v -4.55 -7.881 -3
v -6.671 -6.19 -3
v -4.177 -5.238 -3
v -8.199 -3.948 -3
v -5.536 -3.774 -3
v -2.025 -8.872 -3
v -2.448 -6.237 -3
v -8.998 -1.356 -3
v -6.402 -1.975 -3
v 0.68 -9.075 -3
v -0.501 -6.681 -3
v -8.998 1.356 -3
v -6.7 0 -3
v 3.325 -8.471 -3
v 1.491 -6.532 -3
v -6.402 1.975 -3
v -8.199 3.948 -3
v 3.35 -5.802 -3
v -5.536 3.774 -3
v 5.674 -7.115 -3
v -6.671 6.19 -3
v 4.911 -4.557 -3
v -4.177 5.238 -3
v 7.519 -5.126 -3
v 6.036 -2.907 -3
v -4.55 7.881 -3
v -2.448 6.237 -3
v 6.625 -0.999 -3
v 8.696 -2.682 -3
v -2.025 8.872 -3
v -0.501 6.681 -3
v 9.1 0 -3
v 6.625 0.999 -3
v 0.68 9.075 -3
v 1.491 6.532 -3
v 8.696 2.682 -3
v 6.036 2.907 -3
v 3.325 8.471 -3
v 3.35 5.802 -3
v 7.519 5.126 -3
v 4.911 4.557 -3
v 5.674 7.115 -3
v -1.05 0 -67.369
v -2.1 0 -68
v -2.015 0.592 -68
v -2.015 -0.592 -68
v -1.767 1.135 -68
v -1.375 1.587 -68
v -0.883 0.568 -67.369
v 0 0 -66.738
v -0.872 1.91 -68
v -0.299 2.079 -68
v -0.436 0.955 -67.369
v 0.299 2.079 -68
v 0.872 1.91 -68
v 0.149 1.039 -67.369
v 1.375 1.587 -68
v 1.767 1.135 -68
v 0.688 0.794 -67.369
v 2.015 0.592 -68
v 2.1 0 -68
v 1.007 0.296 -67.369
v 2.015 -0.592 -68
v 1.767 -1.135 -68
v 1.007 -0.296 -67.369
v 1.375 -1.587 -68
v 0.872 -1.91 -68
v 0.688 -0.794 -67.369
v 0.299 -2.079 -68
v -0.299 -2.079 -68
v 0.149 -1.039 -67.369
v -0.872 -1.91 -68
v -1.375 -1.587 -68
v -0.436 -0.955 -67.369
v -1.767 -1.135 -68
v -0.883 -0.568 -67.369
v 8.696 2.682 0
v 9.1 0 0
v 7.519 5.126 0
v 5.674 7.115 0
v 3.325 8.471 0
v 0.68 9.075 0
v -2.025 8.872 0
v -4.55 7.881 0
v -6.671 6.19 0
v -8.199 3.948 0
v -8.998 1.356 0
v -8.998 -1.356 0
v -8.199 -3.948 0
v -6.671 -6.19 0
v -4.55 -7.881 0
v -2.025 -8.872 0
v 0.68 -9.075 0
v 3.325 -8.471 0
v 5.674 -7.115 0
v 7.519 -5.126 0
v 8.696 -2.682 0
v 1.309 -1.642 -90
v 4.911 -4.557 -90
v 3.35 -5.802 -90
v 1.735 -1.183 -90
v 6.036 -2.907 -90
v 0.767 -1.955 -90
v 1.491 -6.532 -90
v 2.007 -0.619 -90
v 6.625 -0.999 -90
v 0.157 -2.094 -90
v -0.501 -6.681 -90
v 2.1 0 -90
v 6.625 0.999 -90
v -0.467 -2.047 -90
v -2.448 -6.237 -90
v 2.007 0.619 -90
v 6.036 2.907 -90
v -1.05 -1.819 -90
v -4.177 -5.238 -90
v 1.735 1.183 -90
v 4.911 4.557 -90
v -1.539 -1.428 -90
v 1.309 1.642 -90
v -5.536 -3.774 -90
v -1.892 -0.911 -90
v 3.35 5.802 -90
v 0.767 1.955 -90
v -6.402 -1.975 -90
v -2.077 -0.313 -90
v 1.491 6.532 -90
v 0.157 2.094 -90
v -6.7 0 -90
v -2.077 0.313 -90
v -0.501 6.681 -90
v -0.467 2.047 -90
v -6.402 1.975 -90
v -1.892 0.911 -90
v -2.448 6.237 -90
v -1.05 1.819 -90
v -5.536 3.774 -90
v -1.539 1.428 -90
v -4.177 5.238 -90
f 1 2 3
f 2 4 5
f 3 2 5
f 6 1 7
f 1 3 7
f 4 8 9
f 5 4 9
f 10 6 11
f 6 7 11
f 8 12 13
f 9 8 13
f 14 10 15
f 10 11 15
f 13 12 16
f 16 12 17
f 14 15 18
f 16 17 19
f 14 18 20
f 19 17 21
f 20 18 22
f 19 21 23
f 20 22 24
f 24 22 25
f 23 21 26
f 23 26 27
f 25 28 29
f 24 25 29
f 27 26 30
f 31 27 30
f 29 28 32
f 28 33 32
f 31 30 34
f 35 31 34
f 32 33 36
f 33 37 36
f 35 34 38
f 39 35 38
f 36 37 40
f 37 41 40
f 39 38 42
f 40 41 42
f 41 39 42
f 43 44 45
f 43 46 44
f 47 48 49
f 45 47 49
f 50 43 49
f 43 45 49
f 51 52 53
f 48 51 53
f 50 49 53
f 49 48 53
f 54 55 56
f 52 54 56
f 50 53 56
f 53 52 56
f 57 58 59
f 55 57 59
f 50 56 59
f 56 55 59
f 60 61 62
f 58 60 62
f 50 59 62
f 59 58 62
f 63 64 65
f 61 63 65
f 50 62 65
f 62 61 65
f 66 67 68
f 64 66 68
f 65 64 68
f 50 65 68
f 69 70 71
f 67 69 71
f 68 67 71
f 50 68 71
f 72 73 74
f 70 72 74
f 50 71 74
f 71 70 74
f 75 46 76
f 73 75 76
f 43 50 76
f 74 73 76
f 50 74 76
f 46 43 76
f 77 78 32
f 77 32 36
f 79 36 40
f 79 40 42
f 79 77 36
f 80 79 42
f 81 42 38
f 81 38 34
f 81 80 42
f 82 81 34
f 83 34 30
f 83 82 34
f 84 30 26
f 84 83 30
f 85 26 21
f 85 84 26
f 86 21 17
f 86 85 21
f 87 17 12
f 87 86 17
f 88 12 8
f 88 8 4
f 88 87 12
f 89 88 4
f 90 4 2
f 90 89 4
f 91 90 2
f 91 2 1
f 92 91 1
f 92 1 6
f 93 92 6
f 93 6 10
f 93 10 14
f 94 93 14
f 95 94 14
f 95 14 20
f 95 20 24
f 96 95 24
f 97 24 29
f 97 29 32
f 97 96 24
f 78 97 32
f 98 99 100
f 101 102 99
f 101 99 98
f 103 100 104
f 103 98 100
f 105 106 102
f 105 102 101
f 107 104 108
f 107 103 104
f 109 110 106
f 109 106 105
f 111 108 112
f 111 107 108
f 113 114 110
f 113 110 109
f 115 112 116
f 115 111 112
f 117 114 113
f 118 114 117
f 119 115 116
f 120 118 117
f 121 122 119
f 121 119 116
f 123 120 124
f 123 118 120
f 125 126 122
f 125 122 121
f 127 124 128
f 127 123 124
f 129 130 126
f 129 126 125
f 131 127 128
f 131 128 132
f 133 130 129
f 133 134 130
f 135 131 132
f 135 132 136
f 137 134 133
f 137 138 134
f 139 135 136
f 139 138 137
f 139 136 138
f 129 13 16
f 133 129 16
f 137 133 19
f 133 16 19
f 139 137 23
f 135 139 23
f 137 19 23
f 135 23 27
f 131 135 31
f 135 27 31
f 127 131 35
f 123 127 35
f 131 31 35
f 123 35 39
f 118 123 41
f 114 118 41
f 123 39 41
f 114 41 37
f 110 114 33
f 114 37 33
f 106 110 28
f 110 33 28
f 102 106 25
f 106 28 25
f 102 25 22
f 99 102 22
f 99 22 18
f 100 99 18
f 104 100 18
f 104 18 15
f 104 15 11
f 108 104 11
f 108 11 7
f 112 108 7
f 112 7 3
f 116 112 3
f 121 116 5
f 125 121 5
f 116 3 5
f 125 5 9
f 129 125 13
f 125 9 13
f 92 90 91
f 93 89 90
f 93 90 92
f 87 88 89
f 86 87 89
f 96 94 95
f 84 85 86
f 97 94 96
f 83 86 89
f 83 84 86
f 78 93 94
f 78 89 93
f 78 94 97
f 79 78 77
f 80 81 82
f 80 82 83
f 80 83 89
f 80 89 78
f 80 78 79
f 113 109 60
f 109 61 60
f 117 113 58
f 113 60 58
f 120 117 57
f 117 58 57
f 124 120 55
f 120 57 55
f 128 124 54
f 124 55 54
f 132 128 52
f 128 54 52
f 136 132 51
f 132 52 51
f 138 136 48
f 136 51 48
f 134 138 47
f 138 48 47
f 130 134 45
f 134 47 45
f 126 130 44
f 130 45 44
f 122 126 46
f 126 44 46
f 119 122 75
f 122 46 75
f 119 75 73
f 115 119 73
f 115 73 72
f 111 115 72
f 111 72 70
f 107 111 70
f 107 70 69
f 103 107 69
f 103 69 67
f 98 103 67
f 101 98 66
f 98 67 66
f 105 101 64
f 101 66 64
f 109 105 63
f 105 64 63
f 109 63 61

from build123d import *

# Parameters (mm, degrees)
ESBO_O1_R                                   = 9.1
RESSALTO_EXTRUS_O1_DEPTH                    = 3
ESBO_O2_R                                   = 6.7
RESSALTO_EXTRUS_O2_DEPTH                    = 87
FURO_ROSCADO_PARA_CONDU_TE_DE_M4X0_72_D     = 4.2
FURO_ROSCADO_PARA_CONDU_TE_DE_M4X0_72_DEPTH = 22
FURO_ROSCADO_PARA_CONDU_TE_DE_M4X0_72_TIP   = 1.2618073


with BuildPart() as part:
    # Esboço1 → Ressalto-extrusão1 (new body)
    with BuildSketch(Plane.XY):
        Circle(ESBO_O1_R)
    extrude(amount=-RESSALTO_EXTRUS_O1_DEPTH)

    # Esboço2 → Ressalto-extrusão2 (add)
    with BuildSketch(Plane(origin=(0, 0, -3), x_dir=(-1, 0, 0), z_dir=(0, 0, -1))):
        Circle(ESBO_O2_R)
    extrude(amount=RESSALTO_EXTRUS_O2_DEPTH)

    # Furo roscado para conduíte de M4x0.72
    with Locations(Plane(origin=(0, 0, -90), x_dir=(-1, 0, 0), z_dir=(0, 0, -1))):
        with Locations((0, 0)):
            Hole(FURO_ROSCADO_PARA_CONDU_TE_DE_M4X0_72_D / 2, depth=FURO_ROSCADO_PARA_CONDU_TE_DE_M4X0_72_DEPTH)
            with Locations((0, 0, -(FURO_ROSCADO_PARA_CONDU_TE_DE_M4X0_72_DEPTH + FURO_ROSCADO_PARA_CONDU_TE_DE_M4X0_72_TIP / 2))):  # 118° drill point
                Cone(0, FURO_ROSCADO_PARA_CONDU_TE_DE_M4X0_72_D / 2, FURO_ROSCADO_PARA_CONDU_TE_DE_M4X0_72_TIP, mode=Mode.SUBTRACT)


solid = part.part
